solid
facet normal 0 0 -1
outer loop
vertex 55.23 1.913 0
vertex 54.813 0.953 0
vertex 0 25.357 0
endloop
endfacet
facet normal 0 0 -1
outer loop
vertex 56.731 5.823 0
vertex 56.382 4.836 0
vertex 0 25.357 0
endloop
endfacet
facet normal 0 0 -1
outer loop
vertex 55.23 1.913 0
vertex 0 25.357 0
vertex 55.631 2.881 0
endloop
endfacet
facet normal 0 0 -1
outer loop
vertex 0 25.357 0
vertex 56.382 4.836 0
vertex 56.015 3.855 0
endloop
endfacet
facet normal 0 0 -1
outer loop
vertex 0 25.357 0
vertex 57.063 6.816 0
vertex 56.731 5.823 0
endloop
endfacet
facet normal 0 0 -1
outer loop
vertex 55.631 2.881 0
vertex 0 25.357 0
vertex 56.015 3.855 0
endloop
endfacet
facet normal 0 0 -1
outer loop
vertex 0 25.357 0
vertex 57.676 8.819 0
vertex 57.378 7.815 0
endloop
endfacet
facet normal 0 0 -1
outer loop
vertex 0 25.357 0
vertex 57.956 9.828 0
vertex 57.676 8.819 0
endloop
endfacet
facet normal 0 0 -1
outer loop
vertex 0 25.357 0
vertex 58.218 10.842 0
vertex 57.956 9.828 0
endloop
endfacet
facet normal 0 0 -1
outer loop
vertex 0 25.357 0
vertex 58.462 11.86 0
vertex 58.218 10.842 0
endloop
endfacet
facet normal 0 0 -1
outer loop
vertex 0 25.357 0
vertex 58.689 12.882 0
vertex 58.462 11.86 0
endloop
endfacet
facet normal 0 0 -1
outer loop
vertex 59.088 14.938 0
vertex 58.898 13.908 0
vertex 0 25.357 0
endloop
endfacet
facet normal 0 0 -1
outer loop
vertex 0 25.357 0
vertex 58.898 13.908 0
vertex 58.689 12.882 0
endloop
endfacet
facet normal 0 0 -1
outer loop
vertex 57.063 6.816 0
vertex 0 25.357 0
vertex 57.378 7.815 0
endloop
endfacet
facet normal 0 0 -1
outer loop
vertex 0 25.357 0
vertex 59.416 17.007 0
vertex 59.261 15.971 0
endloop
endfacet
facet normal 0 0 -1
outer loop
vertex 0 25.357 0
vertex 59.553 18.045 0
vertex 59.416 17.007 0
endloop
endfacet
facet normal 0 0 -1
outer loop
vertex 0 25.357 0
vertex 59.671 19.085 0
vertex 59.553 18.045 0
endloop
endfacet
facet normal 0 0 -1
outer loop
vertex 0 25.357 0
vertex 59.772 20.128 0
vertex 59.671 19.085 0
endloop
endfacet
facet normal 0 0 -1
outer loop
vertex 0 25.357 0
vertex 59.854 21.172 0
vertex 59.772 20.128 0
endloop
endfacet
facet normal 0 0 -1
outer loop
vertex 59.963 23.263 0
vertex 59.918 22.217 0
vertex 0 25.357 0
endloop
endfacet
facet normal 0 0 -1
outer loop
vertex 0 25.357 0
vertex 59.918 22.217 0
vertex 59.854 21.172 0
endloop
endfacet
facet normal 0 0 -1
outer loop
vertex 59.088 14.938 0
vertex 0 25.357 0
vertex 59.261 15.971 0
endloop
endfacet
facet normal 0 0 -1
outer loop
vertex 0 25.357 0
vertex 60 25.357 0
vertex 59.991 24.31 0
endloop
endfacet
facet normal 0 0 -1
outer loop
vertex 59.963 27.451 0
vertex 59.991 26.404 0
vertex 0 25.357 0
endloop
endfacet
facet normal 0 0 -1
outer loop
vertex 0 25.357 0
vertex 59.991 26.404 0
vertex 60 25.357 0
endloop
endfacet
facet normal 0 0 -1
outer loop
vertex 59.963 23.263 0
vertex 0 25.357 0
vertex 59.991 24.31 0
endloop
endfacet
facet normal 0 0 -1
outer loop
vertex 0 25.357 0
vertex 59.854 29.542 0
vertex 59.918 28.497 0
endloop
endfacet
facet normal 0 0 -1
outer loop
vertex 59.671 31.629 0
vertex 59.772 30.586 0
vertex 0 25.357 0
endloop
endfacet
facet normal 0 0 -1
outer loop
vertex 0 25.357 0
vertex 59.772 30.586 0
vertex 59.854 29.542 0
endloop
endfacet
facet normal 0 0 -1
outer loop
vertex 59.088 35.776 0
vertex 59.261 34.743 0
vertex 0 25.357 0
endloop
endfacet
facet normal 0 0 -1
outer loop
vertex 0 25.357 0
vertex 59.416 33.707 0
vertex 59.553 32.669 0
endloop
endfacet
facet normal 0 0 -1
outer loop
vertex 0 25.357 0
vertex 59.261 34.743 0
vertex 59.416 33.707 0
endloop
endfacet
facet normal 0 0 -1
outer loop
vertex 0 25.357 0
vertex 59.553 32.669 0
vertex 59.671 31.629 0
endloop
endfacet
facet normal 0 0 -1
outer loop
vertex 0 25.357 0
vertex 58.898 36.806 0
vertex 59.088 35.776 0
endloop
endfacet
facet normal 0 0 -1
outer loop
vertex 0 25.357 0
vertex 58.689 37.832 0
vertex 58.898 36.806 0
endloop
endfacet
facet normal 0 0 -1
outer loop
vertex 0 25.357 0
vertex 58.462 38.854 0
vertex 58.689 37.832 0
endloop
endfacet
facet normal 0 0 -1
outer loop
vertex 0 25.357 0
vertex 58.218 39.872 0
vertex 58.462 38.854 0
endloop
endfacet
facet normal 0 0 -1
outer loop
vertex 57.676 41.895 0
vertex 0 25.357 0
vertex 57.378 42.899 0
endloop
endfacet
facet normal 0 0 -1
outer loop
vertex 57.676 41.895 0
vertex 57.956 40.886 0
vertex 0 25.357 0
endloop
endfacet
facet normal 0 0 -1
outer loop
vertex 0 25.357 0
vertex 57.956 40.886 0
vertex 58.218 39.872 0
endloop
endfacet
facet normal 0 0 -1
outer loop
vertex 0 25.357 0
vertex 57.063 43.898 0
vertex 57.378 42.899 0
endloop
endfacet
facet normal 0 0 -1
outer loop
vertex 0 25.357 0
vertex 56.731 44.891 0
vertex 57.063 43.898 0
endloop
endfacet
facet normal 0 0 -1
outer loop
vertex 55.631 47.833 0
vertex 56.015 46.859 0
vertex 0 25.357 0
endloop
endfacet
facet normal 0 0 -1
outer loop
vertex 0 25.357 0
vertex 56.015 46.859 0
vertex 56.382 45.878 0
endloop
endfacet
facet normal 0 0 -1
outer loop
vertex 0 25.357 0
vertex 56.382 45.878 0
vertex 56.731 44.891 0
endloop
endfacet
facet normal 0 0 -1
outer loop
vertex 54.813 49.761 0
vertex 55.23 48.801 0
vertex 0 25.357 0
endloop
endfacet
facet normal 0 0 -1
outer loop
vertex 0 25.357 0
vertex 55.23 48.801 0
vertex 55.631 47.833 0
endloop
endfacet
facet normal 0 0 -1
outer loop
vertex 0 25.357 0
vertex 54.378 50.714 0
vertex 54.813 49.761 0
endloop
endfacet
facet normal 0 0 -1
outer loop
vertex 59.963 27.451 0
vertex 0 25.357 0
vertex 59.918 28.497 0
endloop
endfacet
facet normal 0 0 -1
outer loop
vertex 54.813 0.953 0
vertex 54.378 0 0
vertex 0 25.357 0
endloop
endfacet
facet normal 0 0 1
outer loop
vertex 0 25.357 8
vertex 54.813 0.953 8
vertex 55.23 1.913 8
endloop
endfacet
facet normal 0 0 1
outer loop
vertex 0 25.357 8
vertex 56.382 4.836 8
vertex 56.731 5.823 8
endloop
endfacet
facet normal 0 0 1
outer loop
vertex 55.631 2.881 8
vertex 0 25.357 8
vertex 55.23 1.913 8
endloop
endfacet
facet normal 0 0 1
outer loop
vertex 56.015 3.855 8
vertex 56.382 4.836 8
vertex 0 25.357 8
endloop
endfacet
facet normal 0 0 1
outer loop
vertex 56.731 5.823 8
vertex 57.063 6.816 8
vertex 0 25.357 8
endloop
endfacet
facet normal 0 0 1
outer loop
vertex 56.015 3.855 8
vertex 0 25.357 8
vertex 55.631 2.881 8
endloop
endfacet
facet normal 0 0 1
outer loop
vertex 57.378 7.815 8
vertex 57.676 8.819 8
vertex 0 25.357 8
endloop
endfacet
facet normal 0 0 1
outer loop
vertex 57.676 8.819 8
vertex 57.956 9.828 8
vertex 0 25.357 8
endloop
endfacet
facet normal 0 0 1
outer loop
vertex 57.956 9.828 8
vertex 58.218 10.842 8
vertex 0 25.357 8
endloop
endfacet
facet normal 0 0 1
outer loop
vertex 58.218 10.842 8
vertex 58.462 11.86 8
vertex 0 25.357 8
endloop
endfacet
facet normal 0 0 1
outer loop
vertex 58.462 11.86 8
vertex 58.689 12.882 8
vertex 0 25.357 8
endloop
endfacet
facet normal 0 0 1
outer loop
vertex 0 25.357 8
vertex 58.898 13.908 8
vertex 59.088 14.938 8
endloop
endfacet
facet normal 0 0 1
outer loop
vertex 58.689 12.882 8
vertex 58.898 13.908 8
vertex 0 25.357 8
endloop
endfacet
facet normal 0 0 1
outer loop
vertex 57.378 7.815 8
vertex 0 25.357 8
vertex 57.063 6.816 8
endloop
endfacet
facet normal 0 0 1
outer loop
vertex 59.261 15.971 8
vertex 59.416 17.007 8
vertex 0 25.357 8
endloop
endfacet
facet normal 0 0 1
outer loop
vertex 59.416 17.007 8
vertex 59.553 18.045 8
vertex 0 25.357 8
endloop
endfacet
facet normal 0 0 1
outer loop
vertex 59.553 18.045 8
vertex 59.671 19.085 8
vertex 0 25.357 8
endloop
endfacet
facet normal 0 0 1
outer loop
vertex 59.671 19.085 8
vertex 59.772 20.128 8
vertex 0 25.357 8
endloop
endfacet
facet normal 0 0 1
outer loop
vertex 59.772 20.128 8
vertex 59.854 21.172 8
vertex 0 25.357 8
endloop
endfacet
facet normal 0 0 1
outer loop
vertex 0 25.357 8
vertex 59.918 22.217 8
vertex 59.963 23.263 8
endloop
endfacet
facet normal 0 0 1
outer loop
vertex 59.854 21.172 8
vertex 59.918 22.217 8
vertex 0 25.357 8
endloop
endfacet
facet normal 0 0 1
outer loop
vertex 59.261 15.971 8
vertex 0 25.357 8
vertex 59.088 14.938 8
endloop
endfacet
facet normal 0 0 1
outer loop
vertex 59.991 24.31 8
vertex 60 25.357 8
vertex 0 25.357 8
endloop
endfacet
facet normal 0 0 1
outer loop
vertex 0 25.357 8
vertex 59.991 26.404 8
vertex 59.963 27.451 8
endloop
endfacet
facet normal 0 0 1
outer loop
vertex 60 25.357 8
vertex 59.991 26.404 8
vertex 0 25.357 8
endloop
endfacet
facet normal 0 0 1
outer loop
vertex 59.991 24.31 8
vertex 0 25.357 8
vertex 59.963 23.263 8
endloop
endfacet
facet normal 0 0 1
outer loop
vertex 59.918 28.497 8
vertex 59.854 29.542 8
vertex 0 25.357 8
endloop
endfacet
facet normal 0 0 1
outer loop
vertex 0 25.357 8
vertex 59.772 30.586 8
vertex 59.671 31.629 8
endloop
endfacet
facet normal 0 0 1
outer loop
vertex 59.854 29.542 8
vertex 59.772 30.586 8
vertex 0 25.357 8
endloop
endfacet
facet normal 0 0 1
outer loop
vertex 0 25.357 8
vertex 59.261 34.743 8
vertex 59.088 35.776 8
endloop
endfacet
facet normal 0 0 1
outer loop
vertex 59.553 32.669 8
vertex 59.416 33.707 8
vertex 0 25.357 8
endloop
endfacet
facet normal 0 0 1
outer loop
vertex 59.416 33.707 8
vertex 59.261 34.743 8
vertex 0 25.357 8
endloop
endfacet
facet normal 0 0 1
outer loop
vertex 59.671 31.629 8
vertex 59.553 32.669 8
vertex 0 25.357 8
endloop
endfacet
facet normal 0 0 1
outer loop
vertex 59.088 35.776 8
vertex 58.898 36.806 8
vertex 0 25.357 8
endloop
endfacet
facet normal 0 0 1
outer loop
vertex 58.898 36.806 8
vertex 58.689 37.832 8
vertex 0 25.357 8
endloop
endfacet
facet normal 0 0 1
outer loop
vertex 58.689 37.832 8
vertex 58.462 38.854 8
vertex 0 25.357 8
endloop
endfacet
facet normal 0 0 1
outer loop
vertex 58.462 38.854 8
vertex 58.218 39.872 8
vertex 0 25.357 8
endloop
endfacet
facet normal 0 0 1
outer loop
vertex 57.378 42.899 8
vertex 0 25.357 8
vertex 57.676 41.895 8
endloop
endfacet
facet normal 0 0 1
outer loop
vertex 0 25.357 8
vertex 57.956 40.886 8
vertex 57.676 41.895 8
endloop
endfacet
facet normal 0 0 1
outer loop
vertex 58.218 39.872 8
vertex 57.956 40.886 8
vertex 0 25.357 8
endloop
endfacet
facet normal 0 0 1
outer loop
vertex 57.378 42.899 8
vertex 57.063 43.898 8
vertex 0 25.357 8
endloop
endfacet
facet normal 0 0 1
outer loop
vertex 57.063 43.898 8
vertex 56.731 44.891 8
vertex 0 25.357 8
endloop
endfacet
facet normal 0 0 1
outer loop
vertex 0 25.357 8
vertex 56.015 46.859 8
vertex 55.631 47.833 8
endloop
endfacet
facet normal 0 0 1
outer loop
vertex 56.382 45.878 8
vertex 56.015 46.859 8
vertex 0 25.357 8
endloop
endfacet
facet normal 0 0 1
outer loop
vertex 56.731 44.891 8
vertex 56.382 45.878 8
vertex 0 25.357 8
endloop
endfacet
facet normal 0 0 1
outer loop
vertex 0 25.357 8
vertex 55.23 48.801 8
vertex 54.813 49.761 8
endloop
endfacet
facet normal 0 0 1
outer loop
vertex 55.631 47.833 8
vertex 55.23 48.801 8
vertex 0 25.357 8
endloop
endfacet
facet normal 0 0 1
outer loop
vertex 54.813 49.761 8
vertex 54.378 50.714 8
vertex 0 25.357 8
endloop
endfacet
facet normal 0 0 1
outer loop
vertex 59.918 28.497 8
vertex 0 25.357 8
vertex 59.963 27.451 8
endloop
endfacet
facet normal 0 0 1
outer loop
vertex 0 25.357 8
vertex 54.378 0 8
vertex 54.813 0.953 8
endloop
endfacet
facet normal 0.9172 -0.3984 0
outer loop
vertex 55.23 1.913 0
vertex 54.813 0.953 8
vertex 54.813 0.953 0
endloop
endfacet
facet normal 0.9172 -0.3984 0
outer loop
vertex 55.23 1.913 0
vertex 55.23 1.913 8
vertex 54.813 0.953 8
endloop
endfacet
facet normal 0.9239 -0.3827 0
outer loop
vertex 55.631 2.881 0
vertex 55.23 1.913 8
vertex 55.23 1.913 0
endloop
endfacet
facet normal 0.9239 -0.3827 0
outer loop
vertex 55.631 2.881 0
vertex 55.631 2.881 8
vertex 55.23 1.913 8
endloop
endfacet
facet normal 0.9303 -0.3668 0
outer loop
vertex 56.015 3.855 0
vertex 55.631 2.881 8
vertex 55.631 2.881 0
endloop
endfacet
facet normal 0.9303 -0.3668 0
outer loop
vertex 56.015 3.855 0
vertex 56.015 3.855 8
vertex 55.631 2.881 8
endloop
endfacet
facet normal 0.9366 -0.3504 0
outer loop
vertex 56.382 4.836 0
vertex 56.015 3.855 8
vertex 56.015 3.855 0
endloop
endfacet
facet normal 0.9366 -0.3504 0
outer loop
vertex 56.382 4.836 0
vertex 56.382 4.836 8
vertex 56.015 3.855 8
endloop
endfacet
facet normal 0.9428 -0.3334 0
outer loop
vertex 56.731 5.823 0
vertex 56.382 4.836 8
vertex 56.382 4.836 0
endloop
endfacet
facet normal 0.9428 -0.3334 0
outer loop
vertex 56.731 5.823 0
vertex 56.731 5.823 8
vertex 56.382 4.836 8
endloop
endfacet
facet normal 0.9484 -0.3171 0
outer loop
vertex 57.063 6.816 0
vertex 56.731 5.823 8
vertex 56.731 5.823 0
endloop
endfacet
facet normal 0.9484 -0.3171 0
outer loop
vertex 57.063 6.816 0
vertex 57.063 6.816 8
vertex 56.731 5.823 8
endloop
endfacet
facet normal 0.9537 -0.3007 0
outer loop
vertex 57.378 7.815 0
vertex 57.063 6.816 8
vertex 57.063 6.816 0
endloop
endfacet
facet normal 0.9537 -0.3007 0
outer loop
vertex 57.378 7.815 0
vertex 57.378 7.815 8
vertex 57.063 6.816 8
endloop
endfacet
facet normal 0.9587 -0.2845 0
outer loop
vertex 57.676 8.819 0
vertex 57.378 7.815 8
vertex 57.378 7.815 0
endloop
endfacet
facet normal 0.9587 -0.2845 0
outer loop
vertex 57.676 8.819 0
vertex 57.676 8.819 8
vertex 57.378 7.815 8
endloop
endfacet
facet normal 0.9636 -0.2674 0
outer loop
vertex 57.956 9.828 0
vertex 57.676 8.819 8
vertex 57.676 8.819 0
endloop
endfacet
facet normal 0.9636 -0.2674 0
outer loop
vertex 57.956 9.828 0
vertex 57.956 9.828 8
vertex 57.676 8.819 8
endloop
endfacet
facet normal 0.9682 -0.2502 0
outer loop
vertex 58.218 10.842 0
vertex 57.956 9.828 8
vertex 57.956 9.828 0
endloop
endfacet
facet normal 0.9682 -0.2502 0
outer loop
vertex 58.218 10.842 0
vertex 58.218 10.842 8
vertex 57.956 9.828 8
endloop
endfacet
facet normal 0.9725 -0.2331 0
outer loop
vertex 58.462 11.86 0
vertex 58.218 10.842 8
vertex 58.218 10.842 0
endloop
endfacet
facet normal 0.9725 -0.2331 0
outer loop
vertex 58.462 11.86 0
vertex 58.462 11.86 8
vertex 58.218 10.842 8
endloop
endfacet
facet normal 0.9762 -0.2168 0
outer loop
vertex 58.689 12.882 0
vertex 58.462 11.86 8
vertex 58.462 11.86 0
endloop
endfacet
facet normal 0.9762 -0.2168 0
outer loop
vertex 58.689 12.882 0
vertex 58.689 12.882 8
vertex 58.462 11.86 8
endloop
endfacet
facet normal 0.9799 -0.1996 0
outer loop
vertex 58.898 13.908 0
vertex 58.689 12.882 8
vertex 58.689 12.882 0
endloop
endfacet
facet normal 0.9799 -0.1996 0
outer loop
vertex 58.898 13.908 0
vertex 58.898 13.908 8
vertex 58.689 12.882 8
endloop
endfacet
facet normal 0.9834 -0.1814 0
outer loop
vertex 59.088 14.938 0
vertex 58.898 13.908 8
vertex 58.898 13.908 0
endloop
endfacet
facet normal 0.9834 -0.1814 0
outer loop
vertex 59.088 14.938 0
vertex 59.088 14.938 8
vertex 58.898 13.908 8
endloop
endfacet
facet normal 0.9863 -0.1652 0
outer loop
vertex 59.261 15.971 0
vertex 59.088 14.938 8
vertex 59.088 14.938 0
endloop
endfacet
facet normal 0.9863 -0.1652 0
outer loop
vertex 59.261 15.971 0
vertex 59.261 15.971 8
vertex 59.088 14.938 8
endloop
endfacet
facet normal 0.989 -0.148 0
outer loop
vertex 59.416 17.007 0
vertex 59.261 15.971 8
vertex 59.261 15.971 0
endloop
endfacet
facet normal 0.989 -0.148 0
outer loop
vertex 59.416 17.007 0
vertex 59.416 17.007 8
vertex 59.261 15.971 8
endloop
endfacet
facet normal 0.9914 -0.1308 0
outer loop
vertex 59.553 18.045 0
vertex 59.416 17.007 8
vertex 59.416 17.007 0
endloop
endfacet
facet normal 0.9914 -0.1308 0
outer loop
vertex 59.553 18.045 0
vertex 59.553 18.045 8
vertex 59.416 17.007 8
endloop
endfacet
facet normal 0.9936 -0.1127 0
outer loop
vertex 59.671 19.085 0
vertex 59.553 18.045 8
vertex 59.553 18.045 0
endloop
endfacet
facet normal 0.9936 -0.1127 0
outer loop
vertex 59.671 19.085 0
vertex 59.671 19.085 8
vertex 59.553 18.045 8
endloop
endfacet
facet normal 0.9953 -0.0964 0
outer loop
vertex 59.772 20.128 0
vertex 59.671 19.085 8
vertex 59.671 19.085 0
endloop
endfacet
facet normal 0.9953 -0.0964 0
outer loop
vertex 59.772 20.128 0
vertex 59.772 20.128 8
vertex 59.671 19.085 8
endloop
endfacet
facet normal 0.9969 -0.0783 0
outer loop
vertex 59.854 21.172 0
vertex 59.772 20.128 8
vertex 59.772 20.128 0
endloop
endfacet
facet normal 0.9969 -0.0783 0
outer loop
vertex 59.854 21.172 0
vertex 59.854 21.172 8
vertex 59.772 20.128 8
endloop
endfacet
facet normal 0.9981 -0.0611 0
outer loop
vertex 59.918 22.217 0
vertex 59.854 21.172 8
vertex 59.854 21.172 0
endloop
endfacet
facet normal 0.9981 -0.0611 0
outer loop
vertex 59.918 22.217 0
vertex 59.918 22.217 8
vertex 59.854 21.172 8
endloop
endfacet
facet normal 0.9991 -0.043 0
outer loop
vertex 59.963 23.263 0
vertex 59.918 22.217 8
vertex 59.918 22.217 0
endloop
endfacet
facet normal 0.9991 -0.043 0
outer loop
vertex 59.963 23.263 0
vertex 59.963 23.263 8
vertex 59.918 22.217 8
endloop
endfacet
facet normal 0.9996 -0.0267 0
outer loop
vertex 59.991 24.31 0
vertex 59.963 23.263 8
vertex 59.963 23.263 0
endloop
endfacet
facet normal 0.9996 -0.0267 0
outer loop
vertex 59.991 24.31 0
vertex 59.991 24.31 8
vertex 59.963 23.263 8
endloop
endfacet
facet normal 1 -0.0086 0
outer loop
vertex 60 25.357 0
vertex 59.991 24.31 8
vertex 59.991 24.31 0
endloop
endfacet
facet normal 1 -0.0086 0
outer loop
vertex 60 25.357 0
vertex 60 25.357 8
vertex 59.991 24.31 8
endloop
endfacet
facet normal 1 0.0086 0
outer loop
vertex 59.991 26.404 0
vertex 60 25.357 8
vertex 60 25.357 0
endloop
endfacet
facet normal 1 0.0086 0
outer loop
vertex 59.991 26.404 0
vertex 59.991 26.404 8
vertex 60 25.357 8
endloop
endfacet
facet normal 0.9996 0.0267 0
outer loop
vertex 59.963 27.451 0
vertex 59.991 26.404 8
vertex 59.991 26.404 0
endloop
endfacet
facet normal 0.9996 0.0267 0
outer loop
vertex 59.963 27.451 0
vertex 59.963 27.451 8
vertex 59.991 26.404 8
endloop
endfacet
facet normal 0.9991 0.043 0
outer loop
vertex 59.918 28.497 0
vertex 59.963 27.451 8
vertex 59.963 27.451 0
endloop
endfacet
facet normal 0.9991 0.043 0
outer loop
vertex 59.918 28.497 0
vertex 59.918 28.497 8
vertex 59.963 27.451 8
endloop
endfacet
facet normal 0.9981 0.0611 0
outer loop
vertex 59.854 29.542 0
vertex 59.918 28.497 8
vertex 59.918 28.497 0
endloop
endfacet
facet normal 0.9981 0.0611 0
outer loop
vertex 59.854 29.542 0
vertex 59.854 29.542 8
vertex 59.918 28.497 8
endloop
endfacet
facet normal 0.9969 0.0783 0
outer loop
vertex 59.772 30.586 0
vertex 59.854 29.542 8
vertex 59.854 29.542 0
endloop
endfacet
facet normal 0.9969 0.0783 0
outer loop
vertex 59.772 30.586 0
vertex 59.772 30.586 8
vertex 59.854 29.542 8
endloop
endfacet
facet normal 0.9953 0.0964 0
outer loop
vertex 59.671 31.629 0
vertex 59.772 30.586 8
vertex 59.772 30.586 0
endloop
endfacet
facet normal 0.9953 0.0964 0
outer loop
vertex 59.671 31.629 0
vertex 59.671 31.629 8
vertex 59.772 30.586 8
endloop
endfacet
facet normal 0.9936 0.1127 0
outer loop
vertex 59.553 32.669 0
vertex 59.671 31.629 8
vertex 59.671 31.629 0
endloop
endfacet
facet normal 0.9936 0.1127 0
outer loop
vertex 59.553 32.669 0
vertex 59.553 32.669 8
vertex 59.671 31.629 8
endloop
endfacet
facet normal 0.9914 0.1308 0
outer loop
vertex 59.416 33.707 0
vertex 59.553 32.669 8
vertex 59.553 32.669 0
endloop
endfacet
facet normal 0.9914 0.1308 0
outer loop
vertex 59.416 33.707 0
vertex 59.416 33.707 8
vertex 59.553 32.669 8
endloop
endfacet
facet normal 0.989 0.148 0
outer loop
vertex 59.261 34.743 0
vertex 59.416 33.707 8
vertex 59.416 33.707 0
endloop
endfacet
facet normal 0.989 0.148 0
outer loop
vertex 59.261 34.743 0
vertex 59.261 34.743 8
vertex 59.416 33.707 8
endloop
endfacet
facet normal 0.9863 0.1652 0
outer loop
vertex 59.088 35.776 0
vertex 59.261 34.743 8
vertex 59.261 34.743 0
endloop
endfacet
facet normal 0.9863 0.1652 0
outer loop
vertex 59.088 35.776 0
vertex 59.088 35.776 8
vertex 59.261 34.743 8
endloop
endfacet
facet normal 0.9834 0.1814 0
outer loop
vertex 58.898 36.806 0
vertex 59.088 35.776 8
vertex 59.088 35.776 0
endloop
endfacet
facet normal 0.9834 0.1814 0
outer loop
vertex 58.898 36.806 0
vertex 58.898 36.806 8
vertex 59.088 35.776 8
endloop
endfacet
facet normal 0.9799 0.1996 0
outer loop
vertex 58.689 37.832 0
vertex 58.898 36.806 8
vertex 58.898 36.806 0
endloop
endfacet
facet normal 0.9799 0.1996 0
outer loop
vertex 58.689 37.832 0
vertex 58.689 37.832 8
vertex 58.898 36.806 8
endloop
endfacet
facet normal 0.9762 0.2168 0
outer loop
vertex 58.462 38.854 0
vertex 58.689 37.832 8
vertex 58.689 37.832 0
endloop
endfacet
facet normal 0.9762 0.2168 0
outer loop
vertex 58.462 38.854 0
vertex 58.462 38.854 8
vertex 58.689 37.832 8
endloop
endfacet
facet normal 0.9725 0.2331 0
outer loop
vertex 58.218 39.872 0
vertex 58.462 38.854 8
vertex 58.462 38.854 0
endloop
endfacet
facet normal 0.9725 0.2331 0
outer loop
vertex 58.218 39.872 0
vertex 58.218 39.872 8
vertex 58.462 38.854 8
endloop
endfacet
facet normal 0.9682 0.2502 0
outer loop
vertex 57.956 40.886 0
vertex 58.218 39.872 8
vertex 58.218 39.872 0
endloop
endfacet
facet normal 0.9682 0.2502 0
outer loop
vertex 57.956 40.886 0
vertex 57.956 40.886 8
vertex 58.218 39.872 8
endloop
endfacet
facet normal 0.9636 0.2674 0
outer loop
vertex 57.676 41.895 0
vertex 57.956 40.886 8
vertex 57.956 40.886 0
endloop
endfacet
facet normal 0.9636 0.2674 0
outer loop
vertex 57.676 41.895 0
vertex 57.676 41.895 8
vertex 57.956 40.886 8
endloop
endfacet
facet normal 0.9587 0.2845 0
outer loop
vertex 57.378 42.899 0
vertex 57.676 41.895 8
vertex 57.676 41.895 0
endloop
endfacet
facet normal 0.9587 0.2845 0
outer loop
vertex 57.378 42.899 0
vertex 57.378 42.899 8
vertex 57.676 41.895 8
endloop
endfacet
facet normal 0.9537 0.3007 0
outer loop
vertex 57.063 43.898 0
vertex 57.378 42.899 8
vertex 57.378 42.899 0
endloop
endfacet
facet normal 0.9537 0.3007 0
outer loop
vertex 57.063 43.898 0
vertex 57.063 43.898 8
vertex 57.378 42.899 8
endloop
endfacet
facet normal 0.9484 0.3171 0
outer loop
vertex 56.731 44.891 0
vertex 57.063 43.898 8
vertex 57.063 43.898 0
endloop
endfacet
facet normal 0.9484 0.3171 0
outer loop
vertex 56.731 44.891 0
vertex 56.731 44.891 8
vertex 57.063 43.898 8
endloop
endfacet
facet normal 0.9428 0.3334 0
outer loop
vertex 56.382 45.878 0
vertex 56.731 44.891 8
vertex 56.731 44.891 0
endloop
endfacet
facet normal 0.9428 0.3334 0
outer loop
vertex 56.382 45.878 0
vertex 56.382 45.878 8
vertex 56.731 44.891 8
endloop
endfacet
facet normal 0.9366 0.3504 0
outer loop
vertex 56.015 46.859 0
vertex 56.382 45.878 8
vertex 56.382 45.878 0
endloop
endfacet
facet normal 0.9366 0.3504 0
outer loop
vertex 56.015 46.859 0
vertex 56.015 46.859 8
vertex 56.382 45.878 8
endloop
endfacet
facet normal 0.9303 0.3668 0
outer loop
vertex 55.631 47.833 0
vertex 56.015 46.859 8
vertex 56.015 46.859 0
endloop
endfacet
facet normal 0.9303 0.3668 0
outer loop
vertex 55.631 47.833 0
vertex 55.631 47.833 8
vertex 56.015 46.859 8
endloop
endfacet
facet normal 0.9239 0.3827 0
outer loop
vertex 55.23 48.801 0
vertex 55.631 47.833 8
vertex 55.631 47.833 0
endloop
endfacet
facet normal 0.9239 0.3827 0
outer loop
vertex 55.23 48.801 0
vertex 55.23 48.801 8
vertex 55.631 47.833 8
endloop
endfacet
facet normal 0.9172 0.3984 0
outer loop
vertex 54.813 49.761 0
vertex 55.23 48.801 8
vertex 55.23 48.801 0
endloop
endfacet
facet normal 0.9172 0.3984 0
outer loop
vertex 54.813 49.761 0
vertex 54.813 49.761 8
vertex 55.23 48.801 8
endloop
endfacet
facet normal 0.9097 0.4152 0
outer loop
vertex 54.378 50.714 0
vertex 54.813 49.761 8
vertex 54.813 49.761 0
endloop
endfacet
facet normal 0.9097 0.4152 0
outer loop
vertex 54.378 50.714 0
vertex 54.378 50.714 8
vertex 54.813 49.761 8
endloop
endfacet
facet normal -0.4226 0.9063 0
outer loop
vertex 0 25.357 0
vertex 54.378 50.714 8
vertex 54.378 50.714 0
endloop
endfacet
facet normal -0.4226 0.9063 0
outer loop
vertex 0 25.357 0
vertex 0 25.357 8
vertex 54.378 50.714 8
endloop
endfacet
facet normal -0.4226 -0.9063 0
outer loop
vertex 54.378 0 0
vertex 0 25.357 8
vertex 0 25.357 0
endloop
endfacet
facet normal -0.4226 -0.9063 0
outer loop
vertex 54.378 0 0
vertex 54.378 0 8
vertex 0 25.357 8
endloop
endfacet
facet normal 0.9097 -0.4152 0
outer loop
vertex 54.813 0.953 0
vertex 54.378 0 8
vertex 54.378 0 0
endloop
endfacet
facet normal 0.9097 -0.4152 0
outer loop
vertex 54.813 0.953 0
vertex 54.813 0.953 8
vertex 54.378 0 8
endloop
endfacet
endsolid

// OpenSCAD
$fn = 32;

// ----------------------------------------------------------------------
// Arc profile plate: sector, 52 points
// ----------------------------------------------------------------------

// --- parameters (mm) ---
sector_angle = 50;        // sector angle, degrees
sector_r = 60;            // outer radius
arc_step = 1;             // sampling step of the arc, degrees
plate_t = 8;              // plate thickness, Z
fit_tol = 0.1;            // declared fit tolerance (prompt contract)
free_tol = 0.3;           // declared free tolerance (prompt contract)

bbox_x = 2 * sector_r * sin(sector_angle / 2);  // chord of the sector
bbox_y = sector_r;  // depth of the sector (apex to arc)

profile = [[54.378, 0], [54.813, 0.953], [55.23, 1.913], [55.631, 2.881], [56.015, 3.855], [56.382, 4.836], [56.731, 5.823], [57.063, 6.816], [57.378, 7.815], [57.676, 8.819], [57.956, 9.828], [58.218, 10.842], [58.462, 11.86], [58.689, 12.882], [58.898, 13.908], [59.088, 14.938], [59.261, 15.971], [59.416, 17.007], [59.553, 18.045], [59.671, 19.085], [59.772, 20.128], [59.854, 21.172], [59.918, 22.217], [59.963, 23.263], [59.991, 24.31], [60, 25.357], [59.991, 26.404], [59.963, 27.451], [59.918, 28.497], [59.854, 29.542], [59.772, 30.586], [59.671, 31.629], [59.553, 32.669], [59.416, 33.707], [59.261, 34.743], [59.088, 35.776], [58.898, 36.806], [58.689, 37.832], [58.462, 38.854], [58.218, 39.872], [57.956, 40.886], [57.676, 41.895], [57.378, 42.899], [57.063, 43.898], [56.731, 44.891], [56.382, 45.878], [56.015, 46.859], [55.631, 47.833], [55.23, 48.801], [54.813, 49.761], [54.378, 50.714], [0, 25.357]];  // primary outline, 52 points, counter clockwise

// --- the one profile operation ---
linear_extrude(height = plate_t) polygon(points = profile);
